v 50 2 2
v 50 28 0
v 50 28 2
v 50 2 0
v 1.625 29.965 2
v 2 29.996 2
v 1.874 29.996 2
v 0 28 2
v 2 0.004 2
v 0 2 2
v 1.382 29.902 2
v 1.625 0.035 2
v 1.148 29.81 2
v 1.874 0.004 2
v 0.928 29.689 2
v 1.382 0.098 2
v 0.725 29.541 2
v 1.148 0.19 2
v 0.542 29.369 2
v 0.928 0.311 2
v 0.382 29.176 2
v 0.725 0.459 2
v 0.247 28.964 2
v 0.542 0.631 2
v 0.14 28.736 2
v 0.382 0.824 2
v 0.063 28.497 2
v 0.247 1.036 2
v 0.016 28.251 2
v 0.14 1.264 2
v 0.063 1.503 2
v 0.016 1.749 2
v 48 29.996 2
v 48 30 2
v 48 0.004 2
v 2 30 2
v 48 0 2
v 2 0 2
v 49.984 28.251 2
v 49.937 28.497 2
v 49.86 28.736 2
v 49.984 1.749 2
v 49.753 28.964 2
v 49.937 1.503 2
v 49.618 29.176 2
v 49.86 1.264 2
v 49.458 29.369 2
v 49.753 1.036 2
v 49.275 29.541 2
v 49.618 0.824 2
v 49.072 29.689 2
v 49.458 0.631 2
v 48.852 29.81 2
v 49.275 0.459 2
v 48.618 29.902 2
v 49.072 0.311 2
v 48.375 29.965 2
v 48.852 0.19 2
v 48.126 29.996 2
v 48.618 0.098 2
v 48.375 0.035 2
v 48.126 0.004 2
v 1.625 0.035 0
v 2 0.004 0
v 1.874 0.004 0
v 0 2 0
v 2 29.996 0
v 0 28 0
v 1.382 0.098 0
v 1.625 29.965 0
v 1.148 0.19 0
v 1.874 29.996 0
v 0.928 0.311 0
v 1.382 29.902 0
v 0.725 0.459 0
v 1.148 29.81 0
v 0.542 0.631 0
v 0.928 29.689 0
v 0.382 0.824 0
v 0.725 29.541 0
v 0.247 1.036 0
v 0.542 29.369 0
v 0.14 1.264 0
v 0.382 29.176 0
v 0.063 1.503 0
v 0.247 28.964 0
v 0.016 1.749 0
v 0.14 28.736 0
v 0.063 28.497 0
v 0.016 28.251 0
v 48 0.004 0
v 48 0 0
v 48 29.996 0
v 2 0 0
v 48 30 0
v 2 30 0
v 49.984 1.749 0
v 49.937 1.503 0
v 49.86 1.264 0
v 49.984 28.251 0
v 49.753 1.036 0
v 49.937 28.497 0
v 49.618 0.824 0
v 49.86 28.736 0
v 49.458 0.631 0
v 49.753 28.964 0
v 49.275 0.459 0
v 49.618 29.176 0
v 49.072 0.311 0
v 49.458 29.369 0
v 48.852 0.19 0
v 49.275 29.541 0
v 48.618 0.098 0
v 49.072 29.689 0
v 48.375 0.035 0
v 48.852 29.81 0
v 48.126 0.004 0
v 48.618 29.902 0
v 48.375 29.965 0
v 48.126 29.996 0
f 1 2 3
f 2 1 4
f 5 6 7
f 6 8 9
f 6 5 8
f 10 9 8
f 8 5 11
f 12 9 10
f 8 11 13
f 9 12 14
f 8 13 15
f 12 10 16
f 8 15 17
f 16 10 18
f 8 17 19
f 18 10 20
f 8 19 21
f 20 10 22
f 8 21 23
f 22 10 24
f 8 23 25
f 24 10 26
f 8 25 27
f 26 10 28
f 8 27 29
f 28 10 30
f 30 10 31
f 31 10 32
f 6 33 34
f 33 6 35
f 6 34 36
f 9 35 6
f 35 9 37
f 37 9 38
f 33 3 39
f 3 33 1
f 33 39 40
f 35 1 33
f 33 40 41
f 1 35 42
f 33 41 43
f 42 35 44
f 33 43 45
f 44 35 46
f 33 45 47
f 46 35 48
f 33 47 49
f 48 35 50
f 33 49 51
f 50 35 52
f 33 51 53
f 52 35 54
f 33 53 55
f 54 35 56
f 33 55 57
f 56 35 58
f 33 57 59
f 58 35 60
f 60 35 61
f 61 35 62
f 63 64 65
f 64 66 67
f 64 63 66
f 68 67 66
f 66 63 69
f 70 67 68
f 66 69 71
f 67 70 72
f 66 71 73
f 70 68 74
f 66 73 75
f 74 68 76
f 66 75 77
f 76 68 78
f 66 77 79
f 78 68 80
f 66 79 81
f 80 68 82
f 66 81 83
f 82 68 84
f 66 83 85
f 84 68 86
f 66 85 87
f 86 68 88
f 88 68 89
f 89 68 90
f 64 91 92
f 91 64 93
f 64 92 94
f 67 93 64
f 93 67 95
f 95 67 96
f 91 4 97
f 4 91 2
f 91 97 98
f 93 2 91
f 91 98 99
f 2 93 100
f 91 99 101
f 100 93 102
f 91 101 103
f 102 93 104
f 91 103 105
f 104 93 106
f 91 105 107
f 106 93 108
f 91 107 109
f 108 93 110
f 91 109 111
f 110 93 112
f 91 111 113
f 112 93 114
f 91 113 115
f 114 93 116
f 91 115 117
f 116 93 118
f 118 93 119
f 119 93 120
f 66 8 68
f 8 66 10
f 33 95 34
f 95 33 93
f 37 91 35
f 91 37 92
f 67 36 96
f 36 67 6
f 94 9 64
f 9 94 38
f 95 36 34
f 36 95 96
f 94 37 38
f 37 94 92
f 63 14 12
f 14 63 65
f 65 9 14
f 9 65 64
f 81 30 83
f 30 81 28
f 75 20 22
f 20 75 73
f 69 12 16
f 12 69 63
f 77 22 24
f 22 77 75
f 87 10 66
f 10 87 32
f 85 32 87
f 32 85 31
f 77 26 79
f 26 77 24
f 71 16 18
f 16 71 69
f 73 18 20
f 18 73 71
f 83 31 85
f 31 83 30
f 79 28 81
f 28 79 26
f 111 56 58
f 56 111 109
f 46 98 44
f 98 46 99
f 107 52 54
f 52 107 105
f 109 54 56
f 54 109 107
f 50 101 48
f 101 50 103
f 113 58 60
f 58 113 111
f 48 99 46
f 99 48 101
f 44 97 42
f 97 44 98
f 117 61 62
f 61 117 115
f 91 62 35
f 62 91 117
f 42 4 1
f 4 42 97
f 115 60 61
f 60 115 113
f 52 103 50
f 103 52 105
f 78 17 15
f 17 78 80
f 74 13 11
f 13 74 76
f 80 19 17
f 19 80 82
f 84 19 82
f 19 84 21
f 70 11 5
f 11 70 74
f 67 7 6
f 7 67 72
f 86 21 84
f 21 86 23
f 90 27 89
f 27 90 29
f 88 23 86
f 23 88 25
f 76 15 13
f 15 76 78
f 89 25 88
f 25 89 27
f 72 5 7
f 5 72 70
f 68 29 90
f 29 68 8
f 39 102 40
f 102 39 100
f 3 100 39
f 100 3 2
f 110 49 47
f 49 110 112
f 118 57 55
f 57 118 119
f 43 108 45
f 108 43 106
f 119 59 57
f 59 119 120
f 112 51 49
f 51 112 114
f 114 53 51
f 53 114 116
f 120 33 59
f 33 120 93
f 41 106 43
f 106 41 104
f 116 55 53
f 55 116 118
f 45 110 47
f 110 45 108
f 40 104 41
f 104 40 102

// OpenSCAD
// Copied from: https://github.com/Drunkar/openscad_modules/blob/master/modules/RoundedRectangle.scad
// parameters
X = 50;
Y = 30;
THICKNESS = 2;
R = 2;
RESOLUTION = 50;

module RoundedRectangle(x, y, thickness, r, $fn=0) {

    translate([0, r, 0])
        cube([x, y-2*r, thickness]);
    translate([r, 0, 0])
        cube([x-2*r, y, thickness]);

    translate([r, r, 0])
        cylinder(r=r, h=thickness, $fn=$fn);
    translate([x-r, r, 0])
        cylinder(r=r, h=thickness, $fn=$fn);
    translate([r, y-r, 0])
        cylinder(r=r, h=thickness, $fn=$fn);
    translate([x-r, y-r, 0])
        cylinder(r=r, h=thickness, $fn=$fn);

}

// main
RoundedRectangle(x=X, y=Y, thickness=THICKNESS, r=R, $fn=RESOLUTION);
